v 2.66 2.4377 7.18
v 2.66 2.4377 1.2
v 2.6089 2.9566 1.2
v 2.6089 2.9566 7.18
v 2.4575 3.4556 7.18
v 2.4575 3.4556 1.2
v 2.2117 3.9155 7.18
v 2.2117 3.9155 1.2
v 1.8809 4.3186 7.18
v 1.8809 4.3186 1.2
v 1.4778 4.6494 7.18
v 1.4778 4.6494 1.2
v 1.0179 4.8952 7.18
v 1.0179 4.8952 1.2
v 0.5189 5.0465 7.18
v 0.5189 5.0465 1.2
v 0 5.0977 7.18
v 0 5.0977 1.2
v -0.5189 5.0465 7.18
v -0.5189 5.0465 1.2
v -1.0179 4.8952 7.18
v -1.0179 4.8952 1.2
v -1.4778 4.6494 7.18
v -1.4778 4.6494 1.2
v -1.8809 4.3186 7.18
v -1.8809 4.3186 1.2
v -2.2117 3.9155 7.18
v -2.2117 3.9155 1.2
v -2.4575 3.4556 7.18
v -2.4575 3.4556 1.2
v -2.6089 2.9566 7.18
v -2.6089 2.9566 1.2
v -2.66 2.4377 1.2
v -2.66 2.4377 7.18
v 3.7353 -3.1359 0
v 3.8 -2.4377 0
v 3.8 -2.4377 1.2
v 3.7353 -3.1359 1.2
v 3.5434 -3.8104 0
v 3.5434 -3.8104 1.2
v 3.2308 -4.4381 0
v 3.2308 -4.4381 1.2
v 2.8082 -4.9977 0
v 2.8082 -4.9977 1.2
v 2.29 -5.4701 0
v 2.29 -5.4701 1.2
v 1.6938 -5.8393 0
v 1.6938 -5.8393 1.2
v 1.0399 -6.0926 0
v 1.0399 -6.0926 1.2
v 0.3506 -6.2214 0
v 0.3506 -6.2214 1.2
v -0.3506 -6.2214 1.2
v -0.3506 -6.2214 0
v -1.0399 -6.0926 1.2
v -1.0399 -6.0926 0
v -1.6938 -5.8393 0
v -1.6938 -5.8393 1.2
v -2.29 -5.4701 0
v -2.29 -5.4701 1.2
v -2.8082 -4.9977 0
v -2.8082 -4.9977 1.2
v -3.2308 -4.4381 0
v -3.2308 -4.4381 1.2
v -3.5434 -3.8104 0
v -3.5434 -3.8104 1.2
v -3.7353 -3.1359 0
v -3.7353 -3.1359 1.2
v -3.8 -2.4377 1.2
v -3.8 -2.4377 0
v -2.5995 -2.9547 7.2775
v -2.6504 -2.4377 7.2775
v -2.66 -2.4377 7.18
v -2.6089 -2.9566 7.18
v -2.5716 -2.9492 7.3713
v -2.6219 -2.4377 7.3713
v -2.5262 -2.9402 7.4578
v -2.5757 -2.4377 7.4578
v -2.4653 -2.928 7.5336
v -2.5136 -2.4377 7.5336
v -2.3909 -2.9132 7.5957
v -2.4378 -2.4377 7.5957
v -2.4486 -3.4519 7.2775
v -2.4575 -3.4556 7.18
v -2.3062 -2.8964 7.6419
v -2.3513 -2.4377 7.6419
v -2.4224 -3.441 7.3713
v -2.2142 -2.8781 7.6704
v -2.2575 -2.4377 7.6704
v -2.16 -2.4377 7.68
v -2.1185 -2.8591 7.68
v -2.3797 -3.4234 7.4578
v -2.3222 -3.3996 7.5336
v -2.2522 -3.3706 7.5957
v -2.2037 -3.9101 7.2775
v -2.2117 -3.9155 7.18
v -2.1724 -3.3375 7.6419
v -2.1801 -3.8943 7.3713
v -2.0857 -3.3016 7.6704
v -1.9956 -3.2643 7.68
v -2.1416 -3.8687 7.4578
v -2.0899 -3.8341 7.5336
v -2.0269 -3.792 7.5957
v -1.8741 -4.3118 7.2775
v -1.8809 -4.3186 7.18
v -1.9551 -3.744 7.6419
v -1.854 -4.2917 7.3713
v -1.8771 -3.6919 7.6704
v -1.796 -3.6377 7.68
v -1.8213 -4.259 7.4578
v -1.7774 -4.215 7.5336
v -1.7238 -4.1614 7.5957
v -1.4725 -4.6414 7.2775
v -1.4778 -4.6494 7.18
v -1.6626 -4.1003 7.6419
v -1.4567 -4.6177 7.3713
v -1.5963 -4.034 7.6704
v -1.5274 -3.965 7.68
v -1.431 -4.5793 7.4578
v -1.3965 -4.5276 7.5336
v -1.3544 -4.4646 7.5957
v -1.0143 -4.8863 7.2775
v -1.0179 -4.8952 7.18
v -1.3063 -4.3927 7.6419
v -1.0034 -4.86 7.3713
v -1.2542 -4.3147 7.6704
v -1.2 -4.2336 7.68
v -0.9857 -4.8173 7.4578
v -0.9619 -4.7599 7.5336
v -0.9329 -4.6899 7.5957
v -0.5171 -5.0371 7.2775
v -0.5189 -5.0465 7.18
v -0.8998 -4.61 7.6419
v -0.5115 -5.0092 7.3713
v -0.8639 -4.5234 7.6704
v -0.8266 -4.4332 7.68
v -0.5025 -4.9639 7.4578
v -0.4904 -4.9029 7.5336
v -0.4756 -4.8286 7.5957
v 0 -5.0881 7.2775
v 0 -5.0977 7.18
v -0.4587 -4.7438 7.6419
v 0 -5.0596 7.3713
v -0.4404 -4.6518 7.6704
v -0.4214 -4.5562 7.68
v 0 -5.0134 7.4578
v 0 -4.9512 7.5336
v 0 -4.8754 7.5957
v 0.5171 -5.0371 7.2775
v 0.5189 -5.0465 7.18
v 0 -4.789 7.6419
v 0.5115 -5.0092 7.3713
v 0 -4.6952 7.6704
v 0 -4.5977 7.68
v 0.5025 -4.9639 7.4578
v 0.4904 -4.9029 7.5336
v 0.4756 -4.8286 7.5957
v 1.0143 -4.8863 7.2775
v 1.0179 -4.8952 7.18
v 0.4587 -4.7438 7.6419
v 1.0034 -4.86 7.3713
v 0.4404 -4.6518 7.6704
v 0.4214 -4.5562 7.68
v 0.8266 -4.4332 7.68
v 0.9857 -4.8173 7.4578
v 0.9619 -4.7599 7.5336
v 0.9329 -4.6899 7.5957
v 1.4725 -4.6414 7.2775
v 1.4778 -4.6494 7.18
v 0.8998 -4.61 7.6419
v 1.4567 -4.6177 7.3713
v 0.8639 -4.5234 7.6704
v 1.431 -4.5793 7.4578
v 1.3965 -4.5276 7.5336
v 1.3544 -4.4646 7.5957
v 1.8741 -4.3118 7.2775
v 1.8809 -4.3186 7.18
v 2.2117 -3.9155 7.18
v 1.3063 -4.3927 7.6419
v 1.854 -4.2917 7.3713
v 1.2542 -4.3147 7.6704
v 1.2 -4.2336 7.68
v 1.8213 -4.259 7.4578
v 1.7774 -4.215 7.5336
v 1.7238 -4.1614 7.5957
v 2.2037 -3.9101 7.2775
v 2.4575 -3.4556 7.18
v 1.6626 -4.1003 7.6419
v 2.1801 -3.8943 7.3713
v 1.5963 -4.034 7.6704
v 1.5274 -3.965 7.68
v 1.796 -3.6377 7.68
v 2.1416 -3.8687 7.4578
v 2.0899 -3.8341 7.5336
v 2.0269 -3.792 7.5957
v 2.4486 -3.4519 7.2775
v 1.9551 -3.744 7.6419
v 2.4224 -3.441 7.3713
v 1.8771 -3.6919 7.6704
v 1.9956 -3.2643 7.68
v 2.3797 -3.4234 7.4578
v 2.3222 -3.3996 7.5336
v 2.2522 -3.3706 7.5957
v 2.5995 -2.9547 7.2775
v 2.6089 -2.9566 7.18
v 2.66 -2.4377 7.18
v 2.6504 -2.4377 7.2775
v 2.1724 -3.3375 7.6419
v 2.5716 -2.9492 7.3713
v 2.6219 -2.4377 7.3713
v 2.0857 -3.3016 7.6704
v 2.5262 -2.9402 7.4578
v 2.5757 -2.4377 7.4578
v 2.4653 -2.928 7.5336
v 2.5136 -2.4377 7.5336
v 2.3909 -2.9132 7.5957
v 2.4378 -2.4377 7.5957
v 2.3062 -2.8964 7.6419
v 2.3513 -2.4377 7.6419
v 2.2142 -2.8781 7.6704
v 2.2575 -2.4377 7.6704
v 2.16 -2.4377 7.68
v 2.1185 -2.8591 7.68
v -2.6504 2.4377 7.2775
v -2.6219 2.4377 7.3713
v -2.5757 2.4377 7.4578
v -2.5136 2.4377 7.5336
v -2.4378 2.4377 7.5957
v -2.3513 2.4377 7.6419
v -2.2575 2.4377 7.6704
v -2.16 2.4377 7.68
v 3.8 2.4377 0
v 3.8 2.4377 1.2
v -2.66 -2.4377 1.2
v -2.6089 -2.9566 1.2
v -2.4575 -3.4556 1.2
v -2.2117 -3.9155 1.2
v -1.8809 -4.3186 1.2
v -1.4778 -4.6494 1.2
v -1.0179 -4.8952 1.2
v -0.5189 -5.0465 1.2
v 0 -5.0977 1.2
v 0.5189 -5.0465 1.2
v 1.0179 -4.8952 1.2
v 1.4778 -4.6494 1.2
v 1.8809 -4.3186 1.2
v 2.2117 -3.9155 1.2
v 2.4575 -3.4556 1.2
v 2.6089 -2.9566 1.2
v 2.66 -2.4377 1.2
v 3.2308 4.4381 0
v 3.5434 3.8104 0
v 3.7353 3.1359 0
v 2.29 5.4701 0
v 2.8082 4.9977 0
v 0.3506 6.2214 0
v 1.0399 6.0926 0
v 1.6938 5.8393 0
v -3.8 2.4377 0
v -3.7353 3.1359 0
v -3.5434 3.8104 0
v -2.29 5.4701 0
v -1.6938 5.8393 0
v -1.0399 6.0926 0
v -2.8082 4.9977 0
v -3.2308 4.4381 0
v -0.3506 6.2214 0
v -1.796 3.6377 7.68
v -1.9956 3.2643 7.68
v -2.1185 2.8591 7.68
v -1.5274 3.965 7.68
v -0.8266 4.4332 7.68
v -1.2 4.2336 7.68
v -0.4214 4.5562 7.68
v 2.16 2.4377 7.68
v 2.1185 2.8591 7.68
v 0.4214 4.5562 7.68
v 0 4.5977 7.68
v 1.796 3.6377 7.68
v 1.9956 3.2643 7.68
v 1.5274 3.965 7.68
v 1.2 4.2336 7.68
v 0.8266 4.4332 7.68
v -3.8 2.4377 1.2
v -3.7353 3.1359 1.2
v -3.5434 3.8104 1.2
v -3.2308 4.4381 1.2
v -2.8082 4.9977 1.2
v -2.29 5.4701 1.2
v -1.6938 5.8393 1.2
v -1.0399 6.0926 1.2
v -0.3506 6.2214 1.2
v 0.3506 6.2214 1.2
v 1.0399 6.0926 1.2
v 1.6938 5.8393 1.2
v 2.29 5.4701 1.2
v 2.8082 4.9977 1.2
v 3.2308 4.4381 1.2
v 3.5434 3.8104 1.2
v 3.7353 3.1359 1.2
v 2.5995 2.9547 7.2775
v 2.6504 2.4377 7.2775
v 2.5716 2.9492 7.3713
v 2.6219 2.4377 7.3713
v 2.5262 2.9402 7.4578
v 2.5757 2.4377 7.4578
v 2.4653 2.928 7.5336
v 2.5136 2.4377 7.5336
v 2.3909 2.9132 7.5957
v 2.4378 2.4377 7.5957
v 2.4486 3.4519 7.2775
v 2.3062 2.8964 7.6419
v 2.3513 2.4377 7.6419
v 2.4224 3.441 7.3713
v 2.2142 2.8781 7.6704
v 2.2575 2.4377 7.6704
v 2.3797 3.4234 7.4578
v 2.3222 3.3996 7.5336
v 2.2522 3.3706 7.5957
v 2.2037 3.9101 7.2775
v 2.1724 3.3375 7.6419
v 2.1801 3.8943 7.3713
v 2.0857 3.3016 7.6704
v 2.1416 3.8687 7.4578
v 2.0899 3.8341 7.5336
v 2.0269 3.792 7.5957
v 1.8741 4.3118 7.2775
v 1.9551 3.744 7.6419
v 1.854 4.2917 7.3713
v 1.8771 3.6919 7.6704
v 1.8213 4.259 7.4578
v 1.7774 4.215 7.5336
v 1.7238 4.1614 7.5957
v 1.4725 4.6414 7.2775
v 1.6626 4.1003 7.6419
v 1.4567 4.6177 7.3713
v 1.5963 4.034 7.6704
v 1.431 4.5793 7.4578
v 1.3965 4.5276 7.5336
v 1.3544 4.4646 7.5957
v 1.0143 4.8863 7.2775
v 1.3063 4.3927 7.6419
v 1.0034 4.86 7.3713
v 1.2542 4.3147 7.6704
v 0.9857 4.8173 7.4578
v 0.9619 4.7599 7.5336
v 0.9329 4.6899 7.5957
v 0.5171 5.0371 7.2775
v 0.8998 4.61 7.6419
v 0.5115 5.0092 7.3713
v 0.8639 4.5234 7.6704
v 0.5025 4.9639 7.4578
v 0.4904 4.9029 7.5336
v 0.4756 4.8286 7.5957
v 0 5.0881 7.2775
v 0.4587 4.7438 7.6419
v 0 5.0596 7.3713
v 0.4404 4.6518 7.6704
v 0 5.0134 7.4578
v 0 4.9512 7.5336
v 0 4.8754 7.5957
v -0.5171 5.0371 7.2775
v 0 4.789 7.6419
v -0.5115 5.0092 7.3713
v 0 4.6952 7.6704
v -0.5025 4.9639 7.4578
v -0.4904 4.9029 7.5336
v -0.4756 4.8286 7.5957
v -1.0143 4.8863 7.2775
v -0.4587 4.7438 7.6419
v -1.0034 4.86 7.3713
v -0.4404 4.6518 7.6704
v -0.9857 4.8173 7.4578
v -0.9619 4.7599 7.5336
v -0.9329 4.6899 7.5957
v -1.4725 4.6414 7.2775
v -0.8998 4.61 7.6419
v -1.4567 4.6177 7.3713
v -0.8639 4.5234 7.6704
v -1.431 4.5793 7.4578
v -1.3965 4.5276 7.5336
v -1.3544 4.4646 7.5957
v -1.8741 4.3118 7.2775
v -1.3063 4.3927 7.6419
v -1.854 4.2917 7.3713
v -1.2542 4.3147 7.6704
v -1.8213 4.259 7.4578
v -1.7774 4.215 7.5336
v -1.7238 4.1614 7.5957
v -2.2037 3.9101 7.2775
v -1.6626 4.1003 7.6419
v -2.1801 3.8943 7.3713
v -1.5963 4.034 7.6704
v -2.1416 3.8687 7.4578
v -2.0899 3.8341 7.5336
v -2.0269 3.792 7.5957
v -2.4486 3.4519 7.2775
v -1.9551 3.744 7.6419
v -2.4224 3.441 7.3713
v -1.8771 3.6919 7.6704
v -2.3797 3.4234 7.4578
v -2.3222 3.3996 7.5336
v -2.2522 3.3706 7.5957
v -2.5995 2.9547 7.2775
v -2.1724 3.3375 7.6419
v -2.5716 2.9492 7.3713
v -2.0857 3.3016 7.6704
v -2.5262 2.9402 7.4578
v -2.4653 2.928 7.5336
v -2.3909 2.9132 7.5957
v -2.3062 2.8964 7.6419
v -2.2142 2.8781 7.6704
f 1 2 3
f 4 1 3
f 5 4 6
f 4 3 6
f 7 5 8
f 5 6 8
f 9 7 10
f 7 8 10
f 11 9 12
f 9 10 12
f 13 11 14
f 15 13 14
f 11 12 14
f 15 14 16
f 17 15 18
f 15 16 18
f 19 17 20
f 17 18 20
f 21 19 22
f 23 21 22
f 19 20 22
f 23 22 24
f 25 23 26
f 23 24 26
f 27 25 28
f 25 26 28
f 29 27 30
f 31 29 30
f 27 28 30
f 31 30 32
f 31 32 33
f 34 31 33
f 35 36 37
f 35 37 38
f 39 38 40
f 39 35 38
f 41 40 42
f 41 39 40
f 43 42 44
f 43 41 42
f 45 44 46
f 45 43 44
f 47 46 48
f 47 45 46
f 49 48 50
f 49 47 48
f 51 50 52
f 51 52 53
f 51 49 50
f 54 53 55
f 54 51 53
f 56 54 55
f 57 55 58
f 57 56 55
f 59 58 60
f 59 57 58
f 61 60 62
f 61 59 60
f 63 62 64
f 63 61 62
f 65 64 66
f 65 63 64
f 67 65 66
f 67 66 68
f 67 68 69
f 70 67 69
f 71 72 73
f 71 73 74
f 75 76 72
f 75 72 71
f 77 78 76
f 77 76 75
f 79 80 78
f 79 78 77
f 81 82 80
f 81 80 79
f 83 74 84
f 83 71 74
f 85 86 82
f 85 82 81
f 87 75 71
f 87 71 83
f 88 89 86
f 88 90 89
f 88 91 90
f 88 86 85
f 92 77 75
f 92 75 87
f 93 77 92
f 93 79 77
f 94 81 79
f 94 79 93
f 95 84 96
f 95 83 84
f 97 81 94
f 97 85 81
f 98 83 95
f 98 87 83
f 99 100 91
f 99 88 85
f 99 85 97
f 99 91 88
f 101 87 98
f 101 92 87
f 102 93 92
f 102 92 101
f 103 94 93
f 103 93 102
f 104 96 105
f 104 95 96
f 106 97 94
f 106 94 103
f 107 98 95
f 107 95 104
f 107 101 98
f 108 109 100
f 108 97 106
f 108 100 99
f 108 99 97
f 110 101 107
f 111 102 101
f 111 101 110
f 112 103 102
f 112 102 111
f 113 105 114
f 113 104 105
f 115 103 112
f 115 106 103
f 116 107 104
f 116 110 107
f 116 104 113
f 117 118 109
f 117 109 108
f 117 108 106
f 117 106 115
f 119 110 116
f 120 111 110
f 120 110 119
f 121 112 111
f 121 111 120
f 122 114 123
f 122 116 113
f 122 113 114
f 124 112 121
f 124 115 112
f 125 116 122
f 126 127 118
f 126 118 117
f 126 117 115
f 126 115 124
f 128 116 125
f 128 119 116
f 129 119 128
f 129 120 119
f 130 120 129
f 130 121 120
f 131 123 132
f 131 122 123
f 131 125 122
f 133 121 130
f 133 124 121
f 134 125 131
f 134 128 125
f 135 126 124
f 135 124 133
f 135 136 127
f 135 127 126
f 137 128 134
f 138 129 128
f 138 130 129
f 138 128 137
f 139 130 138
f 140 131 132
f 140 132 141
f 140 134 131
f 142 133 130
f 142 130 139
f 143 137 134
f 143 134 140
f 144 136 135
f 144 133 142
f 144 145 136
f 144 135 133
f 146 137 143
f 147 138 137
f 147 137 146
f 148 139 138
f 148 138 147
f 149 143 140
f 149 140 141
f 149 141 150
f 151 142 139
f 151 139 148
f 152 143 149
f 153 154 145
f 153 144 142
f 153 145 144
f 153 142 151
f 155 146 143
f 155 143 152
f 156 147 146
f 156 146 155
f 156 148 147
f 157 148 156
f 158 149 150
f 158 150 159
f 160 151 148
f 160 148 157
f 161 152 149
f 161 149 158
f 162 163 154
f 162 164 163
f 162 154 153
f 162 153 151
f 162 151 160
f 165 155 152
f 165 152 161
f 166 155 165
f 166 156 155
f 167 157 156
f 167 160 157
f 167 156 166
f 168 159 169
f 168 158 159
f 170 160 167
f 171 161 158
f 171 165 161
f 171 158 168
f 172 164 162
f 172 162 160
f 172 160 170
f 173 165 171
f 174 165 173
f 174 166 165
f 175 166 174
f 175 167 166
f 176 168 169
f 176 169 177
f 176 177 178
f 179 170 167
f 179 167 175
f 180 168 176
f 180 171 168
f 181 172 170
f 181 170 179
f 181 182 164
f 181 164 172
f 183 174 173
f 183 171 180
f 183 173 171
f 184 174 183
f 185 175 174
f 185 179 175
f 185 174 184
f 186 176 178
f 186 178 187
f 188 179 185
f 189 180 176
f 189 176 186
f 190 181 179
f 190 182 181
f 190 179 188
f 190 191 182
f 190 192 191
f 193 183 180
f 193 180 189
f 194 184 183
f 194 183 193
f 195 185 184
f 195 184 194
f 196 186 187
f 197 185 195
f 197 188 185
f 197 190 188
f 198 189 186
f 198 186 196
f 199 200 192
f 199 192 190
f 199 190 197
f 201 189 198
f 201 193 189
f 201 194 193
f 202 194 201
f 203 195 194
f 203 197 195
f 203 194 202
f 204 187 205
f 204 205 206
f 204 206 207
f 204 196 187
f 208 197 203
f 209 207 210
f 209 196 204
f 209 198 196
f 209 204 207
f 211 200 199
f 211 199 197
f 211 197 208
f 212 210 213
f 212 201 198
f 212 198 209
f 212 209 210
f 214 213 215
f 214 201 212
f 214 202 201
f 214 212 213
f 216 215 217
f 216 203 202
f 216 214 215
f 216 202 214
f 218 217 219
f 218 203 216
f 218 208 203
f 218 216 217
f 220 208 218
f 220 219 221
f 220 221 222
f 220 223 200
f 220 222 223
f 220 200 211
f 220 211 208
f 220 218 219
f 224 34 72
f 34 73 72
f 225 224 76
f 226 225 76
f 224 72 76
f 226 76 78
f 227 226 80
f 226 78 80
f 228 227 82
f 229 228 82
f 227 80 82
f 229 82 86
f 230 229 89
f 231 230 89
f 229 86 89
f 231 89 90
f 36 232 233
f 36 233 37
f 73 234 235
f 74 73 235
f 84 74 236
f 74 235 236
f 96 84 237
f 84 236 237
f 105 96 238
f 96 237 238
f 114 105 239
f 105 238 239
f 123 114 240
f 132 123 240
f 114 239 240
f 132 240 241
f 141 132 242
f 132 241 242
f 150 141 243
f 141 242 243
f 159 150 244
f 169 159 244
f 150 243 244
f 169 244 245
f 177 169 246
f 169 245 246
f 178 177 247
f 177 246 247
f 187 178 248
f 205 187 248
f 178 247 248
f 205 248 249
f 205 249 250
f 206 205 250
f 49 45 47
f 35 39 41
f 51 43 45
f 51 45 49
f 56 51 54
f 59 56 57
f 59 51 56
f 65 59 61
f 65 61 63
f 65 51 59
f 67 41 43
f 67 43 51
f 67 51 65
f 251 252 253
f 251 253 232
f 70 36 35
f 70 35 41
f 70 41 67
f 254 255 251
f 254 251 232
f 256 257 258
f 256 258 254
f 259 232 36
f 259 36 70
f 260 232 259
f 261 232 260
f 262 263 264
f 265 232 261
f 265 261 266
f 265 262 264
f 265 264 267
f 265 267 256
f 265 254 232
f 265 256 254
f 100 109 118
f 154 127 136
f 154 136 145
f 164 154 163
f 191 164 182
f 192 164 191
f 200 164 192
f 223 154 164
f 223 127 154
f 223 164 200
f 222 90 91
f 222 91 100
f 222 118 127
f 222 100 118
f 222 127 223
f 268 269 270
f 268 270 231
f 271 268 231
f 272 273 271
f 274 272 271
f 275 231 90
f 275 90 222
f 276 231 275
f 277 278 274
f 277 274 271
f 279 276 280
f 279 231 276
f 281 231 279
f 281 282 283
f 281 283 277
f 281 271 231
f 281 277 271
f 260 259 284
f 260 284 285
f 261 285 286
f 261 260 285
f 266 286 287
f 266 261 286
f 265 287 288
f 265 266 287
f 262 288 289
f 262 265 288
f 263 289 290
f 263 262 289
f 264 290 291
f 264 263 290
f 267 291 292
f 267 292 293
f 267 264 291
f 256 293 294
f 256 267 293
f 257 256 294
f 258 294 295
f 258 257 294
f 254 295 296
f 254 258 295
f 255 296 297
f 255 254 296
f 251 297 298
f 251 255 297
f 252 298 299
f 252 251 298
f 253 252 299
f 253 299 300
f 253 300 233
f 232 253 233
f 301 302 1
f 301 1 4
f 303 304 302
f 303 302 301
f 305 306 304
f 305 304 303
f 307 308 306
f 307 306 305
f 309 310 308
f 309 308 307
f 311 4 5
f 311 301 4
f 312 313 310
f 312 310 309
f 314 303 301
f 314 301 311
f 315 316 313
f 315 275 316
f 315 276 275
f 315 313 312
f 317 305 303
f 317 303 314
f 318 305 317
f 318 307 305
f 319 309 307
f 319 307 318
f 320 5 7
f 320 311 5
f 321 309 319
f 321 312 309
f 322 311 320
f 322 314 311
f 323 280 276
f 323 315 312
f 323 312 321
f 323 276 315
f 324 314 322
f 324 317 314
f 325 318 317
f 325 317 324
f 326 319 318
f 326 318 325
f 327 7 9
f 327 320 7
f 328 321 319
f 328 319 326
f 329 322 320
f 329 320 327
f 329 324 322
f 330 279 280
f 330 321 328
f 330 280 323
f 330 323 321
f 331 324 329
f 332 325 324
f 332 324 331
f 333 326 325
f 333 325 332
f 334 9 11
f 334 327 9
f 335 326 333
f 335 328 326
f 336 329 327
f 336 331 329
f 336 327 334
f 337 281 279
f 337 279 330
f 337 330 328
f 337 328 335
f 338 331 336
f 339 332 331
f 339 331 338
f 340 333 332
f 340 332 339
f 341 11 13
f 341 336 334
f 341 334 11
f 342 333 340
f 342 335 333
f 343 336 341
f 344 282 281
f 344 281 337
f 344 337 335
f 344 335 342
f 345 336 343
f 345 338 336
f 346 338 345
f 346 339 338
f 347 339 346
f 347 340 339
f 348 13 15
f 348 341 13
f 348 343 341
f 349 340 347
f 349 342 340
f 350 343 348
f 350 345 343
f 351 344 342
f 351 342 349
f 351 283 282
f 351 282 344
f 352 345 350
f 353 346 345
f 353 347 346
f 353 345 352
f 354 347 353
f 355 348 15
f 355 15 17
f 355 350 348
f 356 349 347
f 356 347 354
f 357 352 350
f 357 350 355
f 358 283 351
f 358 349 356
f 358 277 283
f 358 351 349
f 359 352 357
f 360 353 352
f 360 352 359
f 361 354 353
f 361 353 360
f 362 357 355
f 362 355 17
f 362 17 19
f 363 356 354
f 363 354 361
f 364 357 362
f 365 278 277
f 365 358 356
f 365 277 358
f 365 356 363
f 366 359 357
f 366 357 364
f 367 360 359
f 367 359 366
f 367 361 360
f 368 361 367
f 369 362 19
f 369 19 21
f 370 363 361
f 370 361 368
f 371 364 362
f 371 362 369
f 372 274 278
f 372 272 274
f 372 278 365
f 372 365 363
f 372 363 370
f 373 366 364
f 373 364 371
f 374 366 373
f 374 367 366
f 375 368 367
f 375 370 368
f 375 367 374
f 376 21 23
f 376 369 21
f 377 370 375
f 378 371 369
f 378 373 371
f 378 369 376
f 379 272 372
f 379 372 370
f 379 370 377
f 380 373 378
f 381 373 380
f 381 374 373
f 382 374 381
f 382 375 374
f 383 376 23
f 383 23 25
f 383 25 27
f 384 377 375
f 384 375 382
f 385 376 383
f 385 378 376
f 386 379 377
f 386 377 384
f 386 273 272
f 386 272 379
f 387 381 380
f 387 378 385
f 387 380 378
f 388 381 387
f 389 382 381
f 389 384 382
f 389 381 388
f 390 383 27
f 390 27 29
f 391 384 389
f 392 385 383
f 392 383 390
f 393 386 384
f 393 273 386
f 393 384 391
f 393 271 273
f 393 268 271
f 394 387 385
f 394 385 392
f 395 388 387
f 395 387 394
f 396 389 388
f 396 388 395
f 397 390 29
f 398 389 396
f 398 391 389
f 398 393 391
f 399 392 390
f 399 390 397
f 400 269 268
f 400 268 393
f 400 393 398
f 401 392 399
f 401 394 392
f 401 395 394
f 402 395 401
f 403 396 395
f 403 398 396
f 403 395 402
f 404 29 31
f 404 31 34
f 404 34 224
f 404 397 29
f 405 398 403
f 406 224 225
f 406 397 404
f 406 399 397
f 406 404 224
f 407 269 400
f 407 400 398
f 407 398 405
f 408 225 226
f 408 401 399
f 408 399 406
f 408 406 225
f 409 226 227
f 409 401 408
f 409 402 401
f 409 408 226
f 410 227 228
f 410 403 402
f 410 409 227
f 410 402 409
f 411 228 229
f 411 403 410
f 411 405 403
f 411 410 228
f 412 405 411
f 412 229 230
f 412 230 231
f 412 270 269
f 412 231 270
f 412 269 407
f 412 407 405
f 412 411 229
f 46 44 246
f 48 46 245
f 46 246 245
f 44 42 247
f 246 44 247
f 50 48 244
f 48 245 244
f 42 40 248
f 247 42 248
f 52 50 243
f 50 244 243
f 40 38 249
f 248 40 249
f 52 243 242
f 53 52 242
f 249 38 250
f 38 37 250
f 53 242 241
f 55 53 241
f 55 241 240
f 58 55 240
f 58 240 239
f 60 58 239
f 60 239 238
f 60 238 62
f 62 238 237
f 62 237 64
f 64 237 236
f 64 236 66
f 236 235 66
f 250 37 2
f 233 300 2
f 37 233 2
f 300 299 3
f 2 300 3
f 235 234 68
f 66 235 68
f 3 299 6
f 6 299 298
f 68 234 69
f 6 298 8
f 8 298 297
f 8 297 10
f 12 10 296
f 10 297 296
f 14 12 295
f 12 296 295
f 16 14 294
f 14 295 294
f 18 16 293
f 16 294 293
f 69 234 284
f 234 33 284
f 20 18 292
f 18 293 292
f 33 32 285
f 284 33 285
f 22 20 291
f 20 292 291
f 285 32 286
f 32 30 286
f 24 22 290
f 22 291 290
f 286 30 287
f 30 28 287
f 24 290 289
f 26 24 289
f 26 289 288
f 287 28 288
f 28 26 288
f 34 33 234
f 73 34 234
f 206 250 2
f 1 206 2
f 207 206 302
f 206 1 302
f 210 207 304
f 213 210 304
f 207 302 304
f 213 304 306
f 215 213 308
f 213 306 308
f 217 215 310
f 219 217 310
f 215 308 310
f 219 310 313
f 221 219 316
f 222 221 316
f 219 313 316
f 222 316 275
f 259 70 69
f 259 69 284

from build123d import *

# Parameters (mm, degrees)
BOSS_EXTRUDE1_DEPTH = 1.2
BOSS_EXTRUDE2_DEPTH = 6.48
FILLET1_R           = 0.5


with BuildPart() as part:
    # Sketch1 → Boss-Extrude1 (new body)
    with BuildSketch(Plane.XY):
        with BuildLine():
            Line((-3.8, -2.43766), (-3.8, 2.43766))
            ThreePointArc((-3.8, 2.43766), (0, 6.23766), (3.8, 2.43766))
            Line((3.8, 2.43766), (3.8, -2.43766))
            ThreePointArc((3.8, -2.43766), (0, -6.23766), (-3.8, -2.43766))
        make_face()
    extrude(amount=BOSS_EXTRUDE1_DEPTH)

    # Sketch2 → Boss-Extrude2 (add)
    with BuildSketch(Plane.XY.offset(1.2)):
        with BuildLine():
            Line((2.66, -2.43766), (2.66, 2.43766))
            ThreePointArc((2.66, 2.43766), (0, 5.09766), (-2.66, 2.43766))
            Line((-2.66, 2.43766), (-2.66, -2.43766))
            ThreePointArc((-2.66, -2.43766), (0, -5.09766), (2.66, -2.43766))
        make_face()
    extrude(amount=BOSS_EXTRUDE2_DEPTH)

    # Fillet1
    fillet1_edges = [part.edges().sort_by_distance(p)[0] for p in [
        (0, -5.09766, 7.68),
        (2.66, 0, 7.68),
        (0, 5.09766, 7.68),
        (-2.66, 0, 7.68),
    ]]
    fillet(fillet1_edges, radius=FILLET1_R)


solid = part.part
